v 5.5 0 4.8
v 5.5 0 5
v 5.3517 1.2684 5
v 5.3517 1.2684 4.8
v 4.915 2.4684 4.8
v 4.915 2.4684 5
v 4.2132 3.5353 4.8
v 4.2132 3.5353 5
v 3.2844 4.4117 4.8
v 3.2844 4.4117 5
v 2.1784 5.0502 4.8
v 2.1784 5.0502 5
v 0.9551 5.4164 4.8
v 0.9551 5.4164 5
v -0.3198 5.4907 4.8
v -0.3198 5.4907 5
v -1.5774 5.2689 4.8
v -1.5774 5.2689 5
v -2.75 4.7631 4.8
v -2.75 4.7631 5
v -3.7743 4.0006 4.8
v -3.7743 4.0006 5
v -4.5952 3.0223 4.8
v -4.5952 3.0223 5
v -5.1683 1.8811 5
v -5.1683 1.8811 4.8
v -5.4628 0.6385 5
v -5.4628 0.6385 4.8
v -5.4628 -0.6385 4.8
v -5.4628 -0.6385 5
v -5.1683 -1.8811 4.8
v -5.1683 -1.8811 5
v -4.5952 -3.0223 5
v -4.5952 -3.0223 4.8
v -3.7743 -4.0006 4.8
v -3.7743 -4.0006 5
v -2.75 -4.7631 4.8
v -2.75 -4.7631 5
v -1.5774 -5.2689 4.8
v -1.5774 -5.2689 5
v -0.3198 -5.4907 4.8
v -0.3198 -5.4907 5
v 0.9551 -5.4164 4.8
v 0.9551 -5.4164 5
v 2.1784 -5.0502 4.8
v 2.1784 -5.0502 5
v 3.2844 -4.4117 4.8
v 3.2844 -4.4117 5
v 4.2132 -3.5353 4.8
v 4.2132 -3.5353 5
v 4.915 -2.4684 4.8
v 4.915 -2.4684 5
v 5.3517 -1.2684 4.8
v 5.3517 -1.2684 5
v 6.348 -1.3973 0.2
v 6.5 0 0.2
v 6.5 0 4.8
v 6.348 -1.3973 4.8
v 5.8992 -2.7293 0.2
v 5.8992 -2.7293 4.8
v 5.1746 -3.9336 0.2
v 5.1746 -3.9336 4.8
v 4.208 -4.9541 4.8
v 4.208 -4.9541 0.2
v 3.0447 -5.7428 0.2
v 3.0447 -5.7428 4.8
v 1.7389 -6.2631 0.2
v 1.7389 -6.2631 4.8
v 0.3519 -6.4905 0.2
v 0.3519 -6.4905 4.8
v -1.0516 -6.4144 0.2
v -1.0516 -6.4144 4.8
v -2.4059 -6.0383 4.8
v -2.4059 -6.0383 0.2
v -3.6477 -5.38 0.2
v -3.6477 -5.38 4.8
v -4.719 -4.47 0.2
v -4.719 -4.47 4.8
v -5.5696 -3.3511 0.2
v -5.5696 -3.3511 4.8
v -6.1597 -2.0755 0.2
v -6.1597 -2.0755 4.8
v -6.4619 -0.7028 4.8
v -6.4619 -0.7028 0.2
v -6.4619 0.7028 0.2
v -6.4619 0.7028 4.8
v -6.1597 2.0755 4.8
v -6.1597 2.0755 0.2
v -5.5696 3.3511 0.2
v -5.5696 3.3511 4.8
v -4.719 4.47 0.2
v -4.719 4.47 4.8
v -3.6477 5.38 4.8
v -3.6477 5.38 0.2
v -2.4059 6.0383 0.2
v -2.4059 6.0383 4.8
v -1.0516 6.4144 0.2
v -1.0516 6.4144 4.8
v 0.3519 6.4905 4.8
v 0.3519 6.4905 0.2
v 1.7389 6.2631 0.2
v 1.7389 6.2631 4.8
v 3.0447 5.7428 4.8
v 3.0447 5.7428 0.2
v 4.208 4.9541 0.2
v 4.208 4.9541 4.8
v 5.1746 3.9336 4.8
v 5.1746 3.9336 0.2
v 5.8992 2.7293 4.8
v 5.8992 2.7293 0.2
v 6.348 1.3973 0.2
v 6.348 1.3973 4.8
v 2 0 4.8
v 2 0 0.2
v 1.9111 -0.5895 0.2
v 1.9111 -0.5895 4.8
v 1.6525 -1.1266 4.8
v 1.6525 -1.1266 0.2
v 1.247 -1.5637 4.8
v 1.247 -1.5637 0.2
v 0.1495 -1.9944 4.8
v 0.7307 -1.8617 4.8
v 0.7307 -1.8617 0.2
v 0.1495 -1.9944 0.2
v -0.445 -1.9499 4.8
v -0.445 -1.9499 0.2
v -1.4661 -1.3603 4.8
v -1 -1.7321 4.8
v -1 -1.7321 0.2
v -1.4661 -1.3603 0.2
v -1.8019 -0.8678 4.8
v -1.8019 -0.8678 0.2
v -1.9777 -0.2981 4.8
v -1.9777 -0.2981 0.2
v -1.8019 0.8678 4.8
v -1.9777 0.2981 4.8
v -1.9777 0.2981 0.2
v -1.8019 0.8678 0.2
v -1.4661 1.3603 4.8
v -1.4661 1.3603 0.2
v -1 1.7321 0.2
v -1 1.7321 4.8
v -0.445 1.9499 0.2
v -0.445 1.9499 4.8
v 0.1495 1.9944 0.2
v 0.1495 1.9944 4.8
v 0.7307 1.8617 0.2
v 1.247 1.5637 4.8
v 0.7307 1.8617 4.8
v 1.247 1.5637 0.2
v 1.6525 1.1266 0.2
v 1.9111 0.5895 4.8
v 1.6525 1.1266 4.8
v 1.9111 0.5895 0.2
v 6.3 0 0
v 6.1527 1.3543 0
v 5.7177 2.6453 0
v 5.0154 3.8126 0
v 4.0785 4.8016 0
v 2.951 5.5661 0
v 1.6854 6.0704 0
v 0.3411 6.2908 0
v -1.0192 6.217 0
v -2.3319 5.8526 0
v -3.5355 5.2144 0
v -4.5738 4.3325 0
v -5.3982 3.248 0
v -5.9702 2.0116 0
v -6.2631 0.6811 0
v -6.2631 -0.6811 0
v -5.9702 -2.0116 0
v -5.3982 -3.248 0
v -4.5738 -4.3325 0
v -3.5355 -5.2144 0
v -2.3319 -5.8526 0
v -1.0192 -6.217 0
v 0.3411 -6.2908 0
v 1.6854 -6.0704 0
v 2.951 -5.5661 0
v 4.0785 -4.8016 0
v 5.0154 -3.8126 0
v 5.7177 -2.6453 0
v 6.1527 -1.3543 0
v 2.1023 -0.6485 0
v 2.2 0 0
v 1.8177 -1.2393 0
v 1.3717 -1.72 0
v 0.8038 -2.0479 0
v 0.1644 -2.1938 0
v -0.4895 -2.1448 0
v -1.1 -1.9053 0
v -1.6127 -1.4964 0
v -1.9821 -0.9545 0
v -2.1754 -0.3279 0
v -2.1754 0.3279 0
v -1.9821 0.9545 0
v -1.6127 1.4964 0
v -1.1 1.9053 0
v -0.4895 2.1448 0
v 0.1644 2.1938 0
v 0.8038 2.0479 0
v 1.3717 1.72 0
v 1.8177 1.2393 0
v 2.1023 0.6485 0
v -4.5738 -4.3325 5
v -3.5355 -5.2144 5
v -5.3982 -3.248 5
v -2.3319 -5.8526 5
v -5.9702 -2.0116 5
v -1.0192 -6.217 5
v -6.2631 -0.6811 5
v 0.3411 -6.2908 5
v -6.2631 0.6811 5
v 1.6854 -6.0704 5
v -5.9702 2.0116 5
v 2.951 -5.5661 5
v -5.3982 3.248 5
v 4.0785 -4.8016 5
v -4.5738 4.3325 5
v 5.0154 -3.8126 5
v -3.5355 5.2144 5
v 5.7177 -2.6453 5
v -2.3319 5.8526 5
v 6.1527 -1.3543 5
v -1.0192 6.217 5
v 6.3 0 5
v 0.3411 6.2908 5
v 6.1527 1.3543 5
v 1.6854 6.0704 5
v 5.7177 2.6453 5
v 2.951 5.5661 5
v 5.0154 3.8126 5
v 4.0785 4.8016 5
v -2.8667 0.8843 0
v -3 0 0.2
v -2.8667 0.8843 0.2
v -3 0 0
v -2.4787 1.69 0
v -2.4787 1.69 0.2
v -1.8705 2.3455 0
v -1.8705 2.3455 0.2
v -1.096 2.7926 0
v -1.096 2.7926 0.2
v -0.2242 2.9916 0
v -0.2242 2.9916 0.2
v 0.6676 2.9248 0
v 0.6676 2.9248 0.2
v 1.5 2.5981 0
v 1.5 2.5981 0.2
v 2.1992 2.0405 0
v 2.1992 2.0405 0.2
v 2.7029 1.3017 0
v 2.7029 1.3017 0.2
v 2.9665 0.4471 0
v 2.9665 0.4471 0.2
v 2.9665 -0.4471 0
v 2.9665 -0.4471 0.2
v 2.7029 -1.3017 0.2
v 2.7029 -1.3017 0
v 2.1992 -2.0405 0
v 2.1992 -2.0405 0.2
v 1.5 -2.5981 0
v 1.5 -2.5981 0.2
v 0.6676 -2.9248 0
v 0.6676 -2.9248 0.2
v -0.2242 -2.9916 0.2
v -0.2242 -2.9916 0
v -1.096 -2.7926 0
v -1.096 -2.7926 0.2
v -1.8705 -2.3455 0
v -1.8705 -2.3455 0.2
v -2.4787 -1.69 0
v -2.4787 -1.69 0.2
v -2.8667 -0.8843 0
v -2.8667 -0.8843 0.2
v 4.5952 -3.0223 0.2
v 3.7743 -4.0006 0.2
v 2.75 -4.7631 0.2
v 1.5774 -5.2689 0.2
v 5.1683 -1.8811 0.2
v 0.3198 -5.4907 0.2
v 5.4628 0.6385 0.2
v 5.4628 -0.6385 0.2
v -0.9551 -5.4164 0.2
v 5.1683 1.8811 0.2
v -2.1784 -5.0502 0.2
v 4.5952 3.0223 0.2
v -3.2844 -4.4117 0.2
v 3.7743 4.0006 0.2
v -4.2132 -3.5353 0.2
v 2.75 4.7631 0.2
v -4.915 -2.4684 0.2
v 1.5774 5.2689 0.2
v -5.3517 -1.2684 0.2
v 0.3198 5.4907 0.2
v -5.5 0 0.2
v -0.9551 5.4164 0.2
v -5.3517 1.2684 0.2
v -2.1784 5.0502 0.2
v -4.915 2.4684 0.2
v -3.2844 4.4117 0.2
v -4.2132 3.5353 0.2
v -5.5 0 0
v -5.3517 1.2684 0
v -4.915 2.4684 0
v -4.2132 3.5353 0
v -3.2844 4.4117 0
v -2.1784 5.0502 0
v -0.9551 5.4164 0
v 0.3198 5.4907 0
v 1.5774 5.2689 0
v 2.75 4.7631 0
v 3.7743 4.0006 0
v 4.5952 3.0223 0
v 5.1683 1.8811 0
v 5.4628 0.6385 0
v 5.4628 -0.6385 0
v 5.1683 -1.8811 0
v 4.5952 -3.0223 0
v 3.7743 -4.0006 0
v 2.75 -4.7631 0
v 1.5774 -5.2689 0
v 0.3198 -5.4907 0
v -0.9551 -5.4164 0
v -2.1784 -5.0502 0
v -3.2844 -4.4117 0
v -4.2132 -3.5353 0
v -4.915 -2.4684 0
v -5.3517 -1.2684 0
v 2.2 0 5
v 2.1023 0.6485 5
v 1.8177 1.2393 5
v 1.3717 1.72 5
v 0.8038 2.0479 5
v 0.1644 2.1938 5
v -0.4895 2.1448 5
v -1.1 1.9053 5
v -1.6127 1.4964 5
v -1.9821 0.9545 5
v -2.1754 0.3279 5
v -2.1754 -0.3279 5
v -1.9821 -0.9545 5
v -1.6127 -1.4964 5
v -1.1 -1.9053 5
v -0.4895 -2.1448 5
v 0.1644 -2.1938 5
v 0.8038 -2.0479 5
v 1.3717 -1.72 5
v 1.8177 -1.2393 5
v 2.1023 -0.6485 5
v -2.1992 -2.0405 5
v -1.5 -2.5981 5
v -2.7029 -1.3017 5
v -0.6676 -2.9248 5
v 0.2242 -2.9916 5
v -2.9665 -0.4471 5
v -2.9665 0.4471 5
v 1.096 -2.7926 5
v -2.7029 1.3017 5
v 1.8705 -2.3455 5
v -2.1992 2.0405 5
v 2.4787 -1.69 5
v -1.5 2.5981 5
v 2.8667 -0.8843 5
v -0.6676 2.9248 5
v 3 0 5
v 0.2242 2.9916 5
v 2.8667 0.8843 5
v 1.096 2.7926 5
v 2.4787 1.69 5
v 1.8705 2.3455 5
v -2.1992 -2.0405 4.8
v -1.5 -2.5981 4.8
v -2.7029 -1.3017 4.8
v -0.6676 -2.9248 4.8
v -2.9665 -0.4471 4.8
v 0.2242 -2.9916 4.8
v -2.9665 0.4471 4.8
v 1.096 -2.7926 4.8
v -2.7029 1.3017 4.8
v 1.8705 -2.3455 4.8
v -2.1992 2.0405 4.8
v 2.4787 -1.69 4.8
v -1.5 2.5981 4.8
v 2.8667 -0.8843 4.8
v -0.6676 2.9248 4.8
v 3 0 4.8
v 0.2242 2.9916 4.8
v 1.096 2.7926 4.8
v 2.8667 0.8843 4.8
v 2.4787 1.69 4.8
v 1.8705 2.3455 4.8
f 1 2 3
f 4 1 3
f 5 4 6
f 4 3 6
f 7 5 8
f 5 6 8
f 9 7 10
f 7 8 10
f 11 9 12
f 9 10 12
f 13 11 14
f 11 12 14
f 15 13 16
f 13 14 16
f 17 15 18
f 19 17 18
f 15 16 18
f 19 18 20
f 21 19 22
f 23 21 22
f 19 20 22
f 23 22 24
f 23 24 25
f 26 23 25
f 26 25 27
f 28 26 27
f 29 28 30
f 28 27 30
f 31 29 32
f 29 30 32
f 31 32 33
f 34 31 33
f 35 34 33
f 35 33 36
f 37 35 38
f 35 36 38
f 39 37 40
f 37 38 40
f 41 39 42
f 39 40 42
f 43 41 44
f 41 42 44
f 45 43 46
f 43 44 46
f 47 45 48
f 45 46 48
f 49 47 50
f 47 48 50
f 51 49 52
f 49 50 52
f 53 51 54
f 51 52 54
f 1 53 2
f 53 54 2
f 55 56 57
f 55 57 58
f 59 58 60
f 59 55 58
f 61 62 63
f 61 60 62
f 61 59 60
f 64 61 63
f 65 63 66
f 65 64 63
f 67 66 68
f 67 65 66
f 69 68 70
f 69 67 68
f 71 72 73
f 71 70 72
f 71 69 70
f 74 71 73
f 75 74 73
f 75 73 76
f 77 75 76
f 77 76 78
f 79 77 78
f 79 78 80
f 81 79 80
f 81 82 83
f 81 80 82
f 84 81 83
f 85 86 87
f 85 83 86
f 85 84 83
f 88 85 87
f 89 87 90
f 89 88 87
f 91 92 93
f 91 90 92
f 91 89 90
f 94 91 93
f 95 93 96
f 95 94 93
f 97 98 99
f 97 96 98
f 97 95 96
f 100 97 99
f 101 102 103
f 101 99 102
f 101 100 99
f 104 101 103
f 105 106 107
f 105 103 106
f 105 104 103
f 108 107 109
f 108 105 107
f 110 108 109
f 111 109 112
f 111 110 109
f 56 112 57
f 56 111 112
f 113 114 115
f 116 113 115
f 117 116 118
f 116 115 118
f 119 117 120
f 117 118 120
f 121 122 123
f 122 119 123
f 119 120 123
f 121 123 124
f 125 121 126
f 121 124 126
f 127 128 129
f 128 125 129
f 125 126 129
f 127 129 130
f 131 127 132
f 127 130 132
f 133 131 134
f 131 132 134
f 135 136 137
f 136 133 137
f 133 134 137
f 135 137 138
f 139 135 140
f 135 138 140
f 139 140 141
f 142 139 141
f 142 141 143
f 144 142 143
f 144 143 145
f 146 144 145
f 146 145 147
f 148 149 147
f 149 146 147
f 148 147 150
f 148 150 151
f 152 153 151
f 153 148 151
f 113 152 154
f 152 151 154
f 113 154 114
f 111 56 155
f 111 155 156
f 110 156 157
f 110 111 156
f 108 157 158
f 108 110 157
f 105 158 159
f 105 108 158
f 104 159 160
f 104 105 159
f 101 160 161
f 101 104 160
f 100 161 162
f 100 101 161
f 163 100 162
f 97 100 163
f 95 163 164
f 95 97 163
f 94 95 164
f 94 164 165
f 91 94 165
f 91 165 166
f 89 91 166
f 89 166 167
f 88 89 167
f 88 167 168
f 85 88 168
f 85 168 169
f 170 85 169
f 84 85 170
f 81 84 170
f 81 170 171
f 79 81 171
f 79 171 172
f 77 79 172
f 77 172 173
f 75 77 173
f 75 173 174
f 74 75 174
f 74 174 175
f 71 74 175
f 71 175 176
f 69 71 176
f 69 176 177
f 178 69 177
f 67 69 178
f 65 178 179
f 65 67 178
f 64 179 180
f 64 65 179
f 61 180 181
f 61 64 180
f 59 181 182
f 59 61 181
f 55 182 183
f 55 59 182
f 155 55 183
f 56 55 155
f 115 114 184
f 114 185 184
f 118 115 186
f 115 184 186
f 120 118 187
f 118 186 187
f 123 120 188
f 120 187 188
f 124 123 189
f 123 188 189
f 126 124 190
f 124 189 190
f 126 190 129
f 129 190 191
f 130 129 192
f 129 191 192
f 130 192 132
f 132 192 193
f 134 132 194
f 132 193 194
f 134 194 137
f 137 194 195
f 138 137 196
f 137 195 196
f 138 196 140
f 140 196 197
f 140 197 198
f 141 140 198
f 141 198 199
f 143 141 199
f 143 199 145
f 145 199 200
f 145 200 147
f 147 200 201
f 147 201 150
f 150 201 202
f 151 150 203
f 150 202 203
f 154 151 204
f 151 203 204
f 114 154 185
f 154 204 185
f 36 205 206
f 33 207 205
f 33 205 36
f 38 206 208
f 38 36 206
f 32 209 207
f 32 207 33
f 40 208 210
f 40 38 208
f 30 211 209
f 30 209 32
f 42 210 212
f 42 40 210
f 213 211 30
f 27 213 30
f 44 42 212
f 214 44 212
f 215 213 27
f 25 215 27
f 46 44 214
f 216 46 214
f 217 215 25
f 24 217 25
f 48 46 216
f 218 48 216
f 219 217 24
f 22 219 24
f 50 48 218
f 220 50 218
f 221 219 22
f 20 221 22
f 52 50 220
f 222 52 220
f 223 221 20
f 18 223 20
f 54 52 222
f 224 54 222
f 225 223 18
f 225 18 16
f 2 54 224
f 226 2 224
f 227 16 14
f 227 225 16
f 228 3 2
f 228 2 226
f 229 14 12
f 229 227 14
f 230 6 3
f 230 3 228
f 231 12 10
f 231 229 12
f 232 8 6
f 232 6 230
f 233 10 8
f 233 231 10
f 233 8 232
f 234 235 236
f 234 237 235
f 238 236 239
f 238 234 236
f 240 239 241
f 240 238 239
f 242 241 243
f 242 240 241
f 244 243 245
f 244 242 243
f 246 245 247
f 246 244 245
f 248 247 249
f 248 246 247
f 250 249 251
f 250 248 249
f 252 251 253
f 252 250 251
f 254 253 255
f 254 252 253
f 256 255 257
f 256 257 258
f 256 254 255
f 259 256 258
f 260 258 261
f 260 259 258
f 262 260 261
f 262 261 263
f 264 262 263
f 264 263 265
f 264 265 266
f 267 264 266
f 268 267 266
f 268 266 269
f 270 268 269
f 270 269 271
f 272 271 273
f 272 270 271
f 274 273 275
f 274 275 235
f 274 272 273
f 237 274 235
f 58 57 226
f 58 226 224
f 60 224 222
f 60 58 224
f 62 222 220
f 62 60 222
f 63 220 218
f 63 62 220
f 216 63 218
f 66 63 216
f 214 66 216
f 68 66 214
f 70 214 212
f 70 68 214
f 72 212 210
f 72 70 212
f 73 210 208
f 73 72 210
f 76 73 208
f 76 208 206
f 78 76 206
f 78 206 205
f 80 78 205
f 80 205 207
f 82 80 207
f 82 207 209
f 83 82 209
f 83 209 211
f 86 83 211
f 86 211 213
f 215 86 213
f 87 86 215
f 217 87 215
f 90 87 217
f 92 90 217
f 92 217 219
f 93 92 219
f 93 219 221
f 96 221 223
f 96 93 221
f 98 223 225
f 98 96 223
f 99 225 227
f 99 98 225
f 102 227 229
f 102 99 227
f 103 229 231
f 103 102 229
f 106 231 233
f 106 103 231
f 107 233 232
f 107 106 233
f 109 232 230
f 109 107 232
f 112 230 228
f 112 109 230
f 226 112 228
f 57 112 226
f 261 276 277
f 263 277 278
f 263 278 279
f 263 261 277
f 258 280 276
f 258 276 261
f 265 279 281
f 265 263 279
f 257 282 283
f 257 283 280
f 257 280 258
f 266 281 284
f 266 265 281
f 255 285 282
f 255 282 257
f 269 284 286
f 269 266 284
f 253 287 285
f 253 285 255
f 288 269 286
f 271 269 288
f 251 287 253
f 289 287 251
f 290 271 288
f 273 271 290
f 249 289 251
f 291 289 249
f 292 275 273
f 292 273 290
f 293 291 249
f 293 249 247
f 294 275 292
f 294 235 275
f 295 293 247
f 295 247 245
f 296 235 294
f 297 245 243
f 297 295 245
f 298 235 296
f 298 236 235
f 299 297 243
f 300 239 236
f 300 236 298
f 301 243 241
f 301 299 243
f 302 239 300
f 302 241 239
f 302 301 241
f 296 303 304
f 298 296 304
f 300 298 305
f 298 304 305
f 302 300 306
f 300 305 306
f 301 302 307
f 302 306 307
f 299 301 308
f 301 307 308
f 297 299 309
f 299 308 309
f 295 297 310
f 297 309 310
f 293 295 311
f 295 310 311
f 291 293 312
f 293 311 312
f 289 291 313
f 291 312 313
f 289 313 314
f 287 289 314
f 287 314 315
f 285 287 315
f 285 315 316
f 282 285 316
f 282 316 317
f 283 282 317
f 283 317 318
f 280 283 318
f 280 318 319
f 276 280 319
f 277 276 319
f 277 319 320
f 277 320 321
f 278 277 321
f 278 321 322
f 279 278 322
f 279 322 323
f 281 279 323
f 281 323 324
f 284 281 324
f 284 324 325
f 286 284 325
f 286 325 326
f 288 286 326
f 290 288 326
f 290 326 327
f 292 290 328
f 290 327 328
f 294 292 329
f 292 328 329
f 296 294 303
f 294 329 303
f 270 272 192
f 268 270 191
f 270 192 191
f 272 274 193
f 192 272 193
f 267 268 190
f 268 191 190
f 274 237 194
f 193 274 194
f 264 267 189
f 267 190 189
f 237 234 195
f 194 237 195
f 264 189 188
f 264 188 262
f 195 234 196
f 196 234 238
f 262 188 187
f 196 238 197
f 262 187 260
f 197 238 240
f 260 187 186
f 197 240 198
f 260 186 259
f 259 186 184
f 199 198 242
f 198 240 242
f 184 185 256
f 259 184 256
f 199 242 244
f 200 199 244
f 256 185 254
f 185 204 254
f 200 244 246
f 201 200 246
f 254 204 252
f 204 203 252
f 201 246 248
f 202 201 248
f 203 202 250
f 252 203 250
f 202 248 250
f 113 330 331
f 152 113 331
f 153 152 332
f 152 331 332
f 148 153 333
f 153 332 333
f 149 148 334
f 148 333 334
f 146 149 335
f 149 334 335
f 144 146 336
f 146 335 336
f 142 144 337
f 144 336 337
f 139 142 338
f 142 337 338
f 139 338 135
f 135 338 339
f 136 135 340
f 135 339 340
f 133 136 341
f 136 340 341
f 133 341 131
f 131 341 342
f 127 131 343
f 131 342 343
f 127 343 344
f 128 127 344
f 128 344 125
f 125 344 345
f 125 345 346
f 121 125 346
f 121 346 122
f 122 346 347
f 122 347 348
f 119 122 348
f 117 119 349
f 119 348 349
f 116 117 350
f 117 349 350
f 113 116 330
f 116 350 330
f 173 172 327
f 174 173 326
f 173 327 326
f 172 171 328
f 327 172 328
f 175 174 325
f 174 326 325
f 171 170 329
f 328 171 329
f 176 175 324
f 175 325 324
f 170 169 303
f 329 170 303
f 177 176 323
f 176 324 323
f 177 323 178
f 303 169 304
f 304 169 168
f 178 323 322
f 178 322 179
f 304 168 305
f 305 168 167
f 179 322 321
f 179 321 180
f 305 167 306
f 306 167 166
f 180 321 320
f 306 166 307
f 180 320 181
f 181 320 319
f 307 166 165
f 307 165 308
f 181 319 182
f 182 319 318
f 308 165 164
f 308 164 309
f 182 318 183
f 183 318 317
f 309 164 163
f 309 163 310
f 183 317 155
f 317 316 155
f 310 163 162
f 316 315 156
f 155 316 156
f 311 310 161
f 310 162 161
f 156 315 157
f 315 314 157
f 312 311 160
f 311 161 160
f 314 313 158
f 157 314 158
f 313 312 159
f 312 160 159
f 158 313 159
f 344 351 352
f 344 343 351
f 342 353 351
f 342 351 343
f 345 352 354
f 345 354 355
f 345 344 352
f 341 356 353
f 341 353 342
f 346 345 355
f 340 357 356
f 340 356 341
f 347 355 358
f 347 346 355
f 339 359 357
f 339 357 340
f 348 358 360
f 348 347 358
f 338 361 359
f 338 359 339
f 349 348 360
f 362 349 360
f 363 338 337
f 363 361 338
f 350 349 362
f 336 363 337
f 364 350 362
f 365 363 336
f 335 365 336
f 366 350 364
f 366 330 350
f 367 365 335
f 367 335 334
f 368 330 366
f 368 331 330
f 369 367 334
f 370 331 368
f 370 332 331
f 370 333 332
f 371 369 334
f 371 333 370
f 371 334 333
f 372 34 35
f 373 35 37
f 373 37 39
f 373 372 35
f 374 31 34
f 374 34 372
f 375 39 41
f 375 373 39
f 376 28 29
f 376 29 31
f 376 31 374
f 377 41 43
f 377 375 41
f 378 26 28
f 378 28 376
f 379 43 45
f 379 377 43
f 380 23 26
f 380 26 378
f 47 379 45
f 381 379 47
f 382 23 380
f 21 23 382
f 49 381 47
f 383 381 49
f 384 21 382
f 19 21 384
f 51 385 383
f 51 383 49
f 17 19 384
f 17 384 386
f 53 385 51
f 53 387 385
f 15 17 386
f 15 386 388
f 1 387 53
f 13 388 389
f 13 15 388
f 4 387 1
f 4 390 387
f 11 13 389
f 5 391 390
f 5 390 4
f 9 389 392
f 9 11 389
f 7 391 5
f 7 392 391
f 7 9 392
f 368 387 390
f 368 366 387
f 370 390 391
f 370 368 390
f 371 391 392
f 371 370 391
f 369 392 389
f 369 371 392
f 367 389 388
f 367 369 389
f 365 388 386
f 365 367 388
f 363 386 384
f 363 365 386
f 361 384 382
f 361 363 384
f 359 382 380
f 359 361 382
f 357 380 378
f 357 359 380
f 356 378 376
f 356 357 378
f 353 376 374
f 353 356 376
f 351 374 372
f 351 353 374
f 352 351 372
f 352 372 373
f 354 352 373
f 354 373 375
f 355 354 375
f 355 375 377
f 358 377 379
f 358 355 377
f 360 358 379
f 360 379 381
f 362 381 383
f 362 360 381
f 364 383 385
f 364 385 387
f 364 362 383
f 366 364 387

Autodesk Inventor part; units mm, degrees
ref_plane "YZ Plane" through (0, 0, 0) normal (1, 0, 0) x (0, 1, 0)
ref_plane "XZ Plane" through (0, 0, 0) normal (0, 1, 0) x (-1, 0, 0)
ref_plane "XY Plane" through (0, 0, 0) normal (0, 0, 1) x (1, 0, 0)
sketch "Szkic1" plane through (0, 0, 0) normal (0, 0, 1) x (1, 0, 0)
  circle A0 centre (0, 0) radius 6.5
  circle A1 centre (0, 0) radius 2
  dimension "d0" = 13
  dimension "d1" = 4
extrude "Wyciągnięcie proste1" add sketch "Szkic1" along normal blind 5
chamfer "Faza1" distance 0.2 angle 45 4 edges at (-2, 0, 5) (-6.5, 0, 5) (-6.5, 0, 0) (-2, 0, 0)
sketch "Szkic2" plane through (0, 0, 5) normal (0, 0, 1) x (1, 0, 0)
  circle A0 centre (0, 0) radius 6.5 projected
  circle A1 centre (0, 0) radius 2 projected
  circle A2 centre (0, 0) radius 5.5
  circle A3 centre (0, 0) radius 3
  dimension "d7" = 1
  dimension "d8" = 1
extrude "Wyciągnięcie proste2" cut sketch "Szkic2" against normal blind 0.2 contours A2
sketch "Szkic3" plane through (0, 0, 0) normal (0, 0, -1) x (-1, 0, 0)
  circle A0 centre (0, 0) radius 5.5 projected
  circle A1 centre (0, 0) radius 6.3 projected
  circle A2 centre (0, 0) radius 2.2 projected
  circle A3 centre (0, 0) radius 3 projected
extrude "Wyciągnięcie proste3" cut sketch "Szkic3" against normal blind 0.2 contours A0
properties part number "COTS_GENERIC_Bearing_13x4x5"
